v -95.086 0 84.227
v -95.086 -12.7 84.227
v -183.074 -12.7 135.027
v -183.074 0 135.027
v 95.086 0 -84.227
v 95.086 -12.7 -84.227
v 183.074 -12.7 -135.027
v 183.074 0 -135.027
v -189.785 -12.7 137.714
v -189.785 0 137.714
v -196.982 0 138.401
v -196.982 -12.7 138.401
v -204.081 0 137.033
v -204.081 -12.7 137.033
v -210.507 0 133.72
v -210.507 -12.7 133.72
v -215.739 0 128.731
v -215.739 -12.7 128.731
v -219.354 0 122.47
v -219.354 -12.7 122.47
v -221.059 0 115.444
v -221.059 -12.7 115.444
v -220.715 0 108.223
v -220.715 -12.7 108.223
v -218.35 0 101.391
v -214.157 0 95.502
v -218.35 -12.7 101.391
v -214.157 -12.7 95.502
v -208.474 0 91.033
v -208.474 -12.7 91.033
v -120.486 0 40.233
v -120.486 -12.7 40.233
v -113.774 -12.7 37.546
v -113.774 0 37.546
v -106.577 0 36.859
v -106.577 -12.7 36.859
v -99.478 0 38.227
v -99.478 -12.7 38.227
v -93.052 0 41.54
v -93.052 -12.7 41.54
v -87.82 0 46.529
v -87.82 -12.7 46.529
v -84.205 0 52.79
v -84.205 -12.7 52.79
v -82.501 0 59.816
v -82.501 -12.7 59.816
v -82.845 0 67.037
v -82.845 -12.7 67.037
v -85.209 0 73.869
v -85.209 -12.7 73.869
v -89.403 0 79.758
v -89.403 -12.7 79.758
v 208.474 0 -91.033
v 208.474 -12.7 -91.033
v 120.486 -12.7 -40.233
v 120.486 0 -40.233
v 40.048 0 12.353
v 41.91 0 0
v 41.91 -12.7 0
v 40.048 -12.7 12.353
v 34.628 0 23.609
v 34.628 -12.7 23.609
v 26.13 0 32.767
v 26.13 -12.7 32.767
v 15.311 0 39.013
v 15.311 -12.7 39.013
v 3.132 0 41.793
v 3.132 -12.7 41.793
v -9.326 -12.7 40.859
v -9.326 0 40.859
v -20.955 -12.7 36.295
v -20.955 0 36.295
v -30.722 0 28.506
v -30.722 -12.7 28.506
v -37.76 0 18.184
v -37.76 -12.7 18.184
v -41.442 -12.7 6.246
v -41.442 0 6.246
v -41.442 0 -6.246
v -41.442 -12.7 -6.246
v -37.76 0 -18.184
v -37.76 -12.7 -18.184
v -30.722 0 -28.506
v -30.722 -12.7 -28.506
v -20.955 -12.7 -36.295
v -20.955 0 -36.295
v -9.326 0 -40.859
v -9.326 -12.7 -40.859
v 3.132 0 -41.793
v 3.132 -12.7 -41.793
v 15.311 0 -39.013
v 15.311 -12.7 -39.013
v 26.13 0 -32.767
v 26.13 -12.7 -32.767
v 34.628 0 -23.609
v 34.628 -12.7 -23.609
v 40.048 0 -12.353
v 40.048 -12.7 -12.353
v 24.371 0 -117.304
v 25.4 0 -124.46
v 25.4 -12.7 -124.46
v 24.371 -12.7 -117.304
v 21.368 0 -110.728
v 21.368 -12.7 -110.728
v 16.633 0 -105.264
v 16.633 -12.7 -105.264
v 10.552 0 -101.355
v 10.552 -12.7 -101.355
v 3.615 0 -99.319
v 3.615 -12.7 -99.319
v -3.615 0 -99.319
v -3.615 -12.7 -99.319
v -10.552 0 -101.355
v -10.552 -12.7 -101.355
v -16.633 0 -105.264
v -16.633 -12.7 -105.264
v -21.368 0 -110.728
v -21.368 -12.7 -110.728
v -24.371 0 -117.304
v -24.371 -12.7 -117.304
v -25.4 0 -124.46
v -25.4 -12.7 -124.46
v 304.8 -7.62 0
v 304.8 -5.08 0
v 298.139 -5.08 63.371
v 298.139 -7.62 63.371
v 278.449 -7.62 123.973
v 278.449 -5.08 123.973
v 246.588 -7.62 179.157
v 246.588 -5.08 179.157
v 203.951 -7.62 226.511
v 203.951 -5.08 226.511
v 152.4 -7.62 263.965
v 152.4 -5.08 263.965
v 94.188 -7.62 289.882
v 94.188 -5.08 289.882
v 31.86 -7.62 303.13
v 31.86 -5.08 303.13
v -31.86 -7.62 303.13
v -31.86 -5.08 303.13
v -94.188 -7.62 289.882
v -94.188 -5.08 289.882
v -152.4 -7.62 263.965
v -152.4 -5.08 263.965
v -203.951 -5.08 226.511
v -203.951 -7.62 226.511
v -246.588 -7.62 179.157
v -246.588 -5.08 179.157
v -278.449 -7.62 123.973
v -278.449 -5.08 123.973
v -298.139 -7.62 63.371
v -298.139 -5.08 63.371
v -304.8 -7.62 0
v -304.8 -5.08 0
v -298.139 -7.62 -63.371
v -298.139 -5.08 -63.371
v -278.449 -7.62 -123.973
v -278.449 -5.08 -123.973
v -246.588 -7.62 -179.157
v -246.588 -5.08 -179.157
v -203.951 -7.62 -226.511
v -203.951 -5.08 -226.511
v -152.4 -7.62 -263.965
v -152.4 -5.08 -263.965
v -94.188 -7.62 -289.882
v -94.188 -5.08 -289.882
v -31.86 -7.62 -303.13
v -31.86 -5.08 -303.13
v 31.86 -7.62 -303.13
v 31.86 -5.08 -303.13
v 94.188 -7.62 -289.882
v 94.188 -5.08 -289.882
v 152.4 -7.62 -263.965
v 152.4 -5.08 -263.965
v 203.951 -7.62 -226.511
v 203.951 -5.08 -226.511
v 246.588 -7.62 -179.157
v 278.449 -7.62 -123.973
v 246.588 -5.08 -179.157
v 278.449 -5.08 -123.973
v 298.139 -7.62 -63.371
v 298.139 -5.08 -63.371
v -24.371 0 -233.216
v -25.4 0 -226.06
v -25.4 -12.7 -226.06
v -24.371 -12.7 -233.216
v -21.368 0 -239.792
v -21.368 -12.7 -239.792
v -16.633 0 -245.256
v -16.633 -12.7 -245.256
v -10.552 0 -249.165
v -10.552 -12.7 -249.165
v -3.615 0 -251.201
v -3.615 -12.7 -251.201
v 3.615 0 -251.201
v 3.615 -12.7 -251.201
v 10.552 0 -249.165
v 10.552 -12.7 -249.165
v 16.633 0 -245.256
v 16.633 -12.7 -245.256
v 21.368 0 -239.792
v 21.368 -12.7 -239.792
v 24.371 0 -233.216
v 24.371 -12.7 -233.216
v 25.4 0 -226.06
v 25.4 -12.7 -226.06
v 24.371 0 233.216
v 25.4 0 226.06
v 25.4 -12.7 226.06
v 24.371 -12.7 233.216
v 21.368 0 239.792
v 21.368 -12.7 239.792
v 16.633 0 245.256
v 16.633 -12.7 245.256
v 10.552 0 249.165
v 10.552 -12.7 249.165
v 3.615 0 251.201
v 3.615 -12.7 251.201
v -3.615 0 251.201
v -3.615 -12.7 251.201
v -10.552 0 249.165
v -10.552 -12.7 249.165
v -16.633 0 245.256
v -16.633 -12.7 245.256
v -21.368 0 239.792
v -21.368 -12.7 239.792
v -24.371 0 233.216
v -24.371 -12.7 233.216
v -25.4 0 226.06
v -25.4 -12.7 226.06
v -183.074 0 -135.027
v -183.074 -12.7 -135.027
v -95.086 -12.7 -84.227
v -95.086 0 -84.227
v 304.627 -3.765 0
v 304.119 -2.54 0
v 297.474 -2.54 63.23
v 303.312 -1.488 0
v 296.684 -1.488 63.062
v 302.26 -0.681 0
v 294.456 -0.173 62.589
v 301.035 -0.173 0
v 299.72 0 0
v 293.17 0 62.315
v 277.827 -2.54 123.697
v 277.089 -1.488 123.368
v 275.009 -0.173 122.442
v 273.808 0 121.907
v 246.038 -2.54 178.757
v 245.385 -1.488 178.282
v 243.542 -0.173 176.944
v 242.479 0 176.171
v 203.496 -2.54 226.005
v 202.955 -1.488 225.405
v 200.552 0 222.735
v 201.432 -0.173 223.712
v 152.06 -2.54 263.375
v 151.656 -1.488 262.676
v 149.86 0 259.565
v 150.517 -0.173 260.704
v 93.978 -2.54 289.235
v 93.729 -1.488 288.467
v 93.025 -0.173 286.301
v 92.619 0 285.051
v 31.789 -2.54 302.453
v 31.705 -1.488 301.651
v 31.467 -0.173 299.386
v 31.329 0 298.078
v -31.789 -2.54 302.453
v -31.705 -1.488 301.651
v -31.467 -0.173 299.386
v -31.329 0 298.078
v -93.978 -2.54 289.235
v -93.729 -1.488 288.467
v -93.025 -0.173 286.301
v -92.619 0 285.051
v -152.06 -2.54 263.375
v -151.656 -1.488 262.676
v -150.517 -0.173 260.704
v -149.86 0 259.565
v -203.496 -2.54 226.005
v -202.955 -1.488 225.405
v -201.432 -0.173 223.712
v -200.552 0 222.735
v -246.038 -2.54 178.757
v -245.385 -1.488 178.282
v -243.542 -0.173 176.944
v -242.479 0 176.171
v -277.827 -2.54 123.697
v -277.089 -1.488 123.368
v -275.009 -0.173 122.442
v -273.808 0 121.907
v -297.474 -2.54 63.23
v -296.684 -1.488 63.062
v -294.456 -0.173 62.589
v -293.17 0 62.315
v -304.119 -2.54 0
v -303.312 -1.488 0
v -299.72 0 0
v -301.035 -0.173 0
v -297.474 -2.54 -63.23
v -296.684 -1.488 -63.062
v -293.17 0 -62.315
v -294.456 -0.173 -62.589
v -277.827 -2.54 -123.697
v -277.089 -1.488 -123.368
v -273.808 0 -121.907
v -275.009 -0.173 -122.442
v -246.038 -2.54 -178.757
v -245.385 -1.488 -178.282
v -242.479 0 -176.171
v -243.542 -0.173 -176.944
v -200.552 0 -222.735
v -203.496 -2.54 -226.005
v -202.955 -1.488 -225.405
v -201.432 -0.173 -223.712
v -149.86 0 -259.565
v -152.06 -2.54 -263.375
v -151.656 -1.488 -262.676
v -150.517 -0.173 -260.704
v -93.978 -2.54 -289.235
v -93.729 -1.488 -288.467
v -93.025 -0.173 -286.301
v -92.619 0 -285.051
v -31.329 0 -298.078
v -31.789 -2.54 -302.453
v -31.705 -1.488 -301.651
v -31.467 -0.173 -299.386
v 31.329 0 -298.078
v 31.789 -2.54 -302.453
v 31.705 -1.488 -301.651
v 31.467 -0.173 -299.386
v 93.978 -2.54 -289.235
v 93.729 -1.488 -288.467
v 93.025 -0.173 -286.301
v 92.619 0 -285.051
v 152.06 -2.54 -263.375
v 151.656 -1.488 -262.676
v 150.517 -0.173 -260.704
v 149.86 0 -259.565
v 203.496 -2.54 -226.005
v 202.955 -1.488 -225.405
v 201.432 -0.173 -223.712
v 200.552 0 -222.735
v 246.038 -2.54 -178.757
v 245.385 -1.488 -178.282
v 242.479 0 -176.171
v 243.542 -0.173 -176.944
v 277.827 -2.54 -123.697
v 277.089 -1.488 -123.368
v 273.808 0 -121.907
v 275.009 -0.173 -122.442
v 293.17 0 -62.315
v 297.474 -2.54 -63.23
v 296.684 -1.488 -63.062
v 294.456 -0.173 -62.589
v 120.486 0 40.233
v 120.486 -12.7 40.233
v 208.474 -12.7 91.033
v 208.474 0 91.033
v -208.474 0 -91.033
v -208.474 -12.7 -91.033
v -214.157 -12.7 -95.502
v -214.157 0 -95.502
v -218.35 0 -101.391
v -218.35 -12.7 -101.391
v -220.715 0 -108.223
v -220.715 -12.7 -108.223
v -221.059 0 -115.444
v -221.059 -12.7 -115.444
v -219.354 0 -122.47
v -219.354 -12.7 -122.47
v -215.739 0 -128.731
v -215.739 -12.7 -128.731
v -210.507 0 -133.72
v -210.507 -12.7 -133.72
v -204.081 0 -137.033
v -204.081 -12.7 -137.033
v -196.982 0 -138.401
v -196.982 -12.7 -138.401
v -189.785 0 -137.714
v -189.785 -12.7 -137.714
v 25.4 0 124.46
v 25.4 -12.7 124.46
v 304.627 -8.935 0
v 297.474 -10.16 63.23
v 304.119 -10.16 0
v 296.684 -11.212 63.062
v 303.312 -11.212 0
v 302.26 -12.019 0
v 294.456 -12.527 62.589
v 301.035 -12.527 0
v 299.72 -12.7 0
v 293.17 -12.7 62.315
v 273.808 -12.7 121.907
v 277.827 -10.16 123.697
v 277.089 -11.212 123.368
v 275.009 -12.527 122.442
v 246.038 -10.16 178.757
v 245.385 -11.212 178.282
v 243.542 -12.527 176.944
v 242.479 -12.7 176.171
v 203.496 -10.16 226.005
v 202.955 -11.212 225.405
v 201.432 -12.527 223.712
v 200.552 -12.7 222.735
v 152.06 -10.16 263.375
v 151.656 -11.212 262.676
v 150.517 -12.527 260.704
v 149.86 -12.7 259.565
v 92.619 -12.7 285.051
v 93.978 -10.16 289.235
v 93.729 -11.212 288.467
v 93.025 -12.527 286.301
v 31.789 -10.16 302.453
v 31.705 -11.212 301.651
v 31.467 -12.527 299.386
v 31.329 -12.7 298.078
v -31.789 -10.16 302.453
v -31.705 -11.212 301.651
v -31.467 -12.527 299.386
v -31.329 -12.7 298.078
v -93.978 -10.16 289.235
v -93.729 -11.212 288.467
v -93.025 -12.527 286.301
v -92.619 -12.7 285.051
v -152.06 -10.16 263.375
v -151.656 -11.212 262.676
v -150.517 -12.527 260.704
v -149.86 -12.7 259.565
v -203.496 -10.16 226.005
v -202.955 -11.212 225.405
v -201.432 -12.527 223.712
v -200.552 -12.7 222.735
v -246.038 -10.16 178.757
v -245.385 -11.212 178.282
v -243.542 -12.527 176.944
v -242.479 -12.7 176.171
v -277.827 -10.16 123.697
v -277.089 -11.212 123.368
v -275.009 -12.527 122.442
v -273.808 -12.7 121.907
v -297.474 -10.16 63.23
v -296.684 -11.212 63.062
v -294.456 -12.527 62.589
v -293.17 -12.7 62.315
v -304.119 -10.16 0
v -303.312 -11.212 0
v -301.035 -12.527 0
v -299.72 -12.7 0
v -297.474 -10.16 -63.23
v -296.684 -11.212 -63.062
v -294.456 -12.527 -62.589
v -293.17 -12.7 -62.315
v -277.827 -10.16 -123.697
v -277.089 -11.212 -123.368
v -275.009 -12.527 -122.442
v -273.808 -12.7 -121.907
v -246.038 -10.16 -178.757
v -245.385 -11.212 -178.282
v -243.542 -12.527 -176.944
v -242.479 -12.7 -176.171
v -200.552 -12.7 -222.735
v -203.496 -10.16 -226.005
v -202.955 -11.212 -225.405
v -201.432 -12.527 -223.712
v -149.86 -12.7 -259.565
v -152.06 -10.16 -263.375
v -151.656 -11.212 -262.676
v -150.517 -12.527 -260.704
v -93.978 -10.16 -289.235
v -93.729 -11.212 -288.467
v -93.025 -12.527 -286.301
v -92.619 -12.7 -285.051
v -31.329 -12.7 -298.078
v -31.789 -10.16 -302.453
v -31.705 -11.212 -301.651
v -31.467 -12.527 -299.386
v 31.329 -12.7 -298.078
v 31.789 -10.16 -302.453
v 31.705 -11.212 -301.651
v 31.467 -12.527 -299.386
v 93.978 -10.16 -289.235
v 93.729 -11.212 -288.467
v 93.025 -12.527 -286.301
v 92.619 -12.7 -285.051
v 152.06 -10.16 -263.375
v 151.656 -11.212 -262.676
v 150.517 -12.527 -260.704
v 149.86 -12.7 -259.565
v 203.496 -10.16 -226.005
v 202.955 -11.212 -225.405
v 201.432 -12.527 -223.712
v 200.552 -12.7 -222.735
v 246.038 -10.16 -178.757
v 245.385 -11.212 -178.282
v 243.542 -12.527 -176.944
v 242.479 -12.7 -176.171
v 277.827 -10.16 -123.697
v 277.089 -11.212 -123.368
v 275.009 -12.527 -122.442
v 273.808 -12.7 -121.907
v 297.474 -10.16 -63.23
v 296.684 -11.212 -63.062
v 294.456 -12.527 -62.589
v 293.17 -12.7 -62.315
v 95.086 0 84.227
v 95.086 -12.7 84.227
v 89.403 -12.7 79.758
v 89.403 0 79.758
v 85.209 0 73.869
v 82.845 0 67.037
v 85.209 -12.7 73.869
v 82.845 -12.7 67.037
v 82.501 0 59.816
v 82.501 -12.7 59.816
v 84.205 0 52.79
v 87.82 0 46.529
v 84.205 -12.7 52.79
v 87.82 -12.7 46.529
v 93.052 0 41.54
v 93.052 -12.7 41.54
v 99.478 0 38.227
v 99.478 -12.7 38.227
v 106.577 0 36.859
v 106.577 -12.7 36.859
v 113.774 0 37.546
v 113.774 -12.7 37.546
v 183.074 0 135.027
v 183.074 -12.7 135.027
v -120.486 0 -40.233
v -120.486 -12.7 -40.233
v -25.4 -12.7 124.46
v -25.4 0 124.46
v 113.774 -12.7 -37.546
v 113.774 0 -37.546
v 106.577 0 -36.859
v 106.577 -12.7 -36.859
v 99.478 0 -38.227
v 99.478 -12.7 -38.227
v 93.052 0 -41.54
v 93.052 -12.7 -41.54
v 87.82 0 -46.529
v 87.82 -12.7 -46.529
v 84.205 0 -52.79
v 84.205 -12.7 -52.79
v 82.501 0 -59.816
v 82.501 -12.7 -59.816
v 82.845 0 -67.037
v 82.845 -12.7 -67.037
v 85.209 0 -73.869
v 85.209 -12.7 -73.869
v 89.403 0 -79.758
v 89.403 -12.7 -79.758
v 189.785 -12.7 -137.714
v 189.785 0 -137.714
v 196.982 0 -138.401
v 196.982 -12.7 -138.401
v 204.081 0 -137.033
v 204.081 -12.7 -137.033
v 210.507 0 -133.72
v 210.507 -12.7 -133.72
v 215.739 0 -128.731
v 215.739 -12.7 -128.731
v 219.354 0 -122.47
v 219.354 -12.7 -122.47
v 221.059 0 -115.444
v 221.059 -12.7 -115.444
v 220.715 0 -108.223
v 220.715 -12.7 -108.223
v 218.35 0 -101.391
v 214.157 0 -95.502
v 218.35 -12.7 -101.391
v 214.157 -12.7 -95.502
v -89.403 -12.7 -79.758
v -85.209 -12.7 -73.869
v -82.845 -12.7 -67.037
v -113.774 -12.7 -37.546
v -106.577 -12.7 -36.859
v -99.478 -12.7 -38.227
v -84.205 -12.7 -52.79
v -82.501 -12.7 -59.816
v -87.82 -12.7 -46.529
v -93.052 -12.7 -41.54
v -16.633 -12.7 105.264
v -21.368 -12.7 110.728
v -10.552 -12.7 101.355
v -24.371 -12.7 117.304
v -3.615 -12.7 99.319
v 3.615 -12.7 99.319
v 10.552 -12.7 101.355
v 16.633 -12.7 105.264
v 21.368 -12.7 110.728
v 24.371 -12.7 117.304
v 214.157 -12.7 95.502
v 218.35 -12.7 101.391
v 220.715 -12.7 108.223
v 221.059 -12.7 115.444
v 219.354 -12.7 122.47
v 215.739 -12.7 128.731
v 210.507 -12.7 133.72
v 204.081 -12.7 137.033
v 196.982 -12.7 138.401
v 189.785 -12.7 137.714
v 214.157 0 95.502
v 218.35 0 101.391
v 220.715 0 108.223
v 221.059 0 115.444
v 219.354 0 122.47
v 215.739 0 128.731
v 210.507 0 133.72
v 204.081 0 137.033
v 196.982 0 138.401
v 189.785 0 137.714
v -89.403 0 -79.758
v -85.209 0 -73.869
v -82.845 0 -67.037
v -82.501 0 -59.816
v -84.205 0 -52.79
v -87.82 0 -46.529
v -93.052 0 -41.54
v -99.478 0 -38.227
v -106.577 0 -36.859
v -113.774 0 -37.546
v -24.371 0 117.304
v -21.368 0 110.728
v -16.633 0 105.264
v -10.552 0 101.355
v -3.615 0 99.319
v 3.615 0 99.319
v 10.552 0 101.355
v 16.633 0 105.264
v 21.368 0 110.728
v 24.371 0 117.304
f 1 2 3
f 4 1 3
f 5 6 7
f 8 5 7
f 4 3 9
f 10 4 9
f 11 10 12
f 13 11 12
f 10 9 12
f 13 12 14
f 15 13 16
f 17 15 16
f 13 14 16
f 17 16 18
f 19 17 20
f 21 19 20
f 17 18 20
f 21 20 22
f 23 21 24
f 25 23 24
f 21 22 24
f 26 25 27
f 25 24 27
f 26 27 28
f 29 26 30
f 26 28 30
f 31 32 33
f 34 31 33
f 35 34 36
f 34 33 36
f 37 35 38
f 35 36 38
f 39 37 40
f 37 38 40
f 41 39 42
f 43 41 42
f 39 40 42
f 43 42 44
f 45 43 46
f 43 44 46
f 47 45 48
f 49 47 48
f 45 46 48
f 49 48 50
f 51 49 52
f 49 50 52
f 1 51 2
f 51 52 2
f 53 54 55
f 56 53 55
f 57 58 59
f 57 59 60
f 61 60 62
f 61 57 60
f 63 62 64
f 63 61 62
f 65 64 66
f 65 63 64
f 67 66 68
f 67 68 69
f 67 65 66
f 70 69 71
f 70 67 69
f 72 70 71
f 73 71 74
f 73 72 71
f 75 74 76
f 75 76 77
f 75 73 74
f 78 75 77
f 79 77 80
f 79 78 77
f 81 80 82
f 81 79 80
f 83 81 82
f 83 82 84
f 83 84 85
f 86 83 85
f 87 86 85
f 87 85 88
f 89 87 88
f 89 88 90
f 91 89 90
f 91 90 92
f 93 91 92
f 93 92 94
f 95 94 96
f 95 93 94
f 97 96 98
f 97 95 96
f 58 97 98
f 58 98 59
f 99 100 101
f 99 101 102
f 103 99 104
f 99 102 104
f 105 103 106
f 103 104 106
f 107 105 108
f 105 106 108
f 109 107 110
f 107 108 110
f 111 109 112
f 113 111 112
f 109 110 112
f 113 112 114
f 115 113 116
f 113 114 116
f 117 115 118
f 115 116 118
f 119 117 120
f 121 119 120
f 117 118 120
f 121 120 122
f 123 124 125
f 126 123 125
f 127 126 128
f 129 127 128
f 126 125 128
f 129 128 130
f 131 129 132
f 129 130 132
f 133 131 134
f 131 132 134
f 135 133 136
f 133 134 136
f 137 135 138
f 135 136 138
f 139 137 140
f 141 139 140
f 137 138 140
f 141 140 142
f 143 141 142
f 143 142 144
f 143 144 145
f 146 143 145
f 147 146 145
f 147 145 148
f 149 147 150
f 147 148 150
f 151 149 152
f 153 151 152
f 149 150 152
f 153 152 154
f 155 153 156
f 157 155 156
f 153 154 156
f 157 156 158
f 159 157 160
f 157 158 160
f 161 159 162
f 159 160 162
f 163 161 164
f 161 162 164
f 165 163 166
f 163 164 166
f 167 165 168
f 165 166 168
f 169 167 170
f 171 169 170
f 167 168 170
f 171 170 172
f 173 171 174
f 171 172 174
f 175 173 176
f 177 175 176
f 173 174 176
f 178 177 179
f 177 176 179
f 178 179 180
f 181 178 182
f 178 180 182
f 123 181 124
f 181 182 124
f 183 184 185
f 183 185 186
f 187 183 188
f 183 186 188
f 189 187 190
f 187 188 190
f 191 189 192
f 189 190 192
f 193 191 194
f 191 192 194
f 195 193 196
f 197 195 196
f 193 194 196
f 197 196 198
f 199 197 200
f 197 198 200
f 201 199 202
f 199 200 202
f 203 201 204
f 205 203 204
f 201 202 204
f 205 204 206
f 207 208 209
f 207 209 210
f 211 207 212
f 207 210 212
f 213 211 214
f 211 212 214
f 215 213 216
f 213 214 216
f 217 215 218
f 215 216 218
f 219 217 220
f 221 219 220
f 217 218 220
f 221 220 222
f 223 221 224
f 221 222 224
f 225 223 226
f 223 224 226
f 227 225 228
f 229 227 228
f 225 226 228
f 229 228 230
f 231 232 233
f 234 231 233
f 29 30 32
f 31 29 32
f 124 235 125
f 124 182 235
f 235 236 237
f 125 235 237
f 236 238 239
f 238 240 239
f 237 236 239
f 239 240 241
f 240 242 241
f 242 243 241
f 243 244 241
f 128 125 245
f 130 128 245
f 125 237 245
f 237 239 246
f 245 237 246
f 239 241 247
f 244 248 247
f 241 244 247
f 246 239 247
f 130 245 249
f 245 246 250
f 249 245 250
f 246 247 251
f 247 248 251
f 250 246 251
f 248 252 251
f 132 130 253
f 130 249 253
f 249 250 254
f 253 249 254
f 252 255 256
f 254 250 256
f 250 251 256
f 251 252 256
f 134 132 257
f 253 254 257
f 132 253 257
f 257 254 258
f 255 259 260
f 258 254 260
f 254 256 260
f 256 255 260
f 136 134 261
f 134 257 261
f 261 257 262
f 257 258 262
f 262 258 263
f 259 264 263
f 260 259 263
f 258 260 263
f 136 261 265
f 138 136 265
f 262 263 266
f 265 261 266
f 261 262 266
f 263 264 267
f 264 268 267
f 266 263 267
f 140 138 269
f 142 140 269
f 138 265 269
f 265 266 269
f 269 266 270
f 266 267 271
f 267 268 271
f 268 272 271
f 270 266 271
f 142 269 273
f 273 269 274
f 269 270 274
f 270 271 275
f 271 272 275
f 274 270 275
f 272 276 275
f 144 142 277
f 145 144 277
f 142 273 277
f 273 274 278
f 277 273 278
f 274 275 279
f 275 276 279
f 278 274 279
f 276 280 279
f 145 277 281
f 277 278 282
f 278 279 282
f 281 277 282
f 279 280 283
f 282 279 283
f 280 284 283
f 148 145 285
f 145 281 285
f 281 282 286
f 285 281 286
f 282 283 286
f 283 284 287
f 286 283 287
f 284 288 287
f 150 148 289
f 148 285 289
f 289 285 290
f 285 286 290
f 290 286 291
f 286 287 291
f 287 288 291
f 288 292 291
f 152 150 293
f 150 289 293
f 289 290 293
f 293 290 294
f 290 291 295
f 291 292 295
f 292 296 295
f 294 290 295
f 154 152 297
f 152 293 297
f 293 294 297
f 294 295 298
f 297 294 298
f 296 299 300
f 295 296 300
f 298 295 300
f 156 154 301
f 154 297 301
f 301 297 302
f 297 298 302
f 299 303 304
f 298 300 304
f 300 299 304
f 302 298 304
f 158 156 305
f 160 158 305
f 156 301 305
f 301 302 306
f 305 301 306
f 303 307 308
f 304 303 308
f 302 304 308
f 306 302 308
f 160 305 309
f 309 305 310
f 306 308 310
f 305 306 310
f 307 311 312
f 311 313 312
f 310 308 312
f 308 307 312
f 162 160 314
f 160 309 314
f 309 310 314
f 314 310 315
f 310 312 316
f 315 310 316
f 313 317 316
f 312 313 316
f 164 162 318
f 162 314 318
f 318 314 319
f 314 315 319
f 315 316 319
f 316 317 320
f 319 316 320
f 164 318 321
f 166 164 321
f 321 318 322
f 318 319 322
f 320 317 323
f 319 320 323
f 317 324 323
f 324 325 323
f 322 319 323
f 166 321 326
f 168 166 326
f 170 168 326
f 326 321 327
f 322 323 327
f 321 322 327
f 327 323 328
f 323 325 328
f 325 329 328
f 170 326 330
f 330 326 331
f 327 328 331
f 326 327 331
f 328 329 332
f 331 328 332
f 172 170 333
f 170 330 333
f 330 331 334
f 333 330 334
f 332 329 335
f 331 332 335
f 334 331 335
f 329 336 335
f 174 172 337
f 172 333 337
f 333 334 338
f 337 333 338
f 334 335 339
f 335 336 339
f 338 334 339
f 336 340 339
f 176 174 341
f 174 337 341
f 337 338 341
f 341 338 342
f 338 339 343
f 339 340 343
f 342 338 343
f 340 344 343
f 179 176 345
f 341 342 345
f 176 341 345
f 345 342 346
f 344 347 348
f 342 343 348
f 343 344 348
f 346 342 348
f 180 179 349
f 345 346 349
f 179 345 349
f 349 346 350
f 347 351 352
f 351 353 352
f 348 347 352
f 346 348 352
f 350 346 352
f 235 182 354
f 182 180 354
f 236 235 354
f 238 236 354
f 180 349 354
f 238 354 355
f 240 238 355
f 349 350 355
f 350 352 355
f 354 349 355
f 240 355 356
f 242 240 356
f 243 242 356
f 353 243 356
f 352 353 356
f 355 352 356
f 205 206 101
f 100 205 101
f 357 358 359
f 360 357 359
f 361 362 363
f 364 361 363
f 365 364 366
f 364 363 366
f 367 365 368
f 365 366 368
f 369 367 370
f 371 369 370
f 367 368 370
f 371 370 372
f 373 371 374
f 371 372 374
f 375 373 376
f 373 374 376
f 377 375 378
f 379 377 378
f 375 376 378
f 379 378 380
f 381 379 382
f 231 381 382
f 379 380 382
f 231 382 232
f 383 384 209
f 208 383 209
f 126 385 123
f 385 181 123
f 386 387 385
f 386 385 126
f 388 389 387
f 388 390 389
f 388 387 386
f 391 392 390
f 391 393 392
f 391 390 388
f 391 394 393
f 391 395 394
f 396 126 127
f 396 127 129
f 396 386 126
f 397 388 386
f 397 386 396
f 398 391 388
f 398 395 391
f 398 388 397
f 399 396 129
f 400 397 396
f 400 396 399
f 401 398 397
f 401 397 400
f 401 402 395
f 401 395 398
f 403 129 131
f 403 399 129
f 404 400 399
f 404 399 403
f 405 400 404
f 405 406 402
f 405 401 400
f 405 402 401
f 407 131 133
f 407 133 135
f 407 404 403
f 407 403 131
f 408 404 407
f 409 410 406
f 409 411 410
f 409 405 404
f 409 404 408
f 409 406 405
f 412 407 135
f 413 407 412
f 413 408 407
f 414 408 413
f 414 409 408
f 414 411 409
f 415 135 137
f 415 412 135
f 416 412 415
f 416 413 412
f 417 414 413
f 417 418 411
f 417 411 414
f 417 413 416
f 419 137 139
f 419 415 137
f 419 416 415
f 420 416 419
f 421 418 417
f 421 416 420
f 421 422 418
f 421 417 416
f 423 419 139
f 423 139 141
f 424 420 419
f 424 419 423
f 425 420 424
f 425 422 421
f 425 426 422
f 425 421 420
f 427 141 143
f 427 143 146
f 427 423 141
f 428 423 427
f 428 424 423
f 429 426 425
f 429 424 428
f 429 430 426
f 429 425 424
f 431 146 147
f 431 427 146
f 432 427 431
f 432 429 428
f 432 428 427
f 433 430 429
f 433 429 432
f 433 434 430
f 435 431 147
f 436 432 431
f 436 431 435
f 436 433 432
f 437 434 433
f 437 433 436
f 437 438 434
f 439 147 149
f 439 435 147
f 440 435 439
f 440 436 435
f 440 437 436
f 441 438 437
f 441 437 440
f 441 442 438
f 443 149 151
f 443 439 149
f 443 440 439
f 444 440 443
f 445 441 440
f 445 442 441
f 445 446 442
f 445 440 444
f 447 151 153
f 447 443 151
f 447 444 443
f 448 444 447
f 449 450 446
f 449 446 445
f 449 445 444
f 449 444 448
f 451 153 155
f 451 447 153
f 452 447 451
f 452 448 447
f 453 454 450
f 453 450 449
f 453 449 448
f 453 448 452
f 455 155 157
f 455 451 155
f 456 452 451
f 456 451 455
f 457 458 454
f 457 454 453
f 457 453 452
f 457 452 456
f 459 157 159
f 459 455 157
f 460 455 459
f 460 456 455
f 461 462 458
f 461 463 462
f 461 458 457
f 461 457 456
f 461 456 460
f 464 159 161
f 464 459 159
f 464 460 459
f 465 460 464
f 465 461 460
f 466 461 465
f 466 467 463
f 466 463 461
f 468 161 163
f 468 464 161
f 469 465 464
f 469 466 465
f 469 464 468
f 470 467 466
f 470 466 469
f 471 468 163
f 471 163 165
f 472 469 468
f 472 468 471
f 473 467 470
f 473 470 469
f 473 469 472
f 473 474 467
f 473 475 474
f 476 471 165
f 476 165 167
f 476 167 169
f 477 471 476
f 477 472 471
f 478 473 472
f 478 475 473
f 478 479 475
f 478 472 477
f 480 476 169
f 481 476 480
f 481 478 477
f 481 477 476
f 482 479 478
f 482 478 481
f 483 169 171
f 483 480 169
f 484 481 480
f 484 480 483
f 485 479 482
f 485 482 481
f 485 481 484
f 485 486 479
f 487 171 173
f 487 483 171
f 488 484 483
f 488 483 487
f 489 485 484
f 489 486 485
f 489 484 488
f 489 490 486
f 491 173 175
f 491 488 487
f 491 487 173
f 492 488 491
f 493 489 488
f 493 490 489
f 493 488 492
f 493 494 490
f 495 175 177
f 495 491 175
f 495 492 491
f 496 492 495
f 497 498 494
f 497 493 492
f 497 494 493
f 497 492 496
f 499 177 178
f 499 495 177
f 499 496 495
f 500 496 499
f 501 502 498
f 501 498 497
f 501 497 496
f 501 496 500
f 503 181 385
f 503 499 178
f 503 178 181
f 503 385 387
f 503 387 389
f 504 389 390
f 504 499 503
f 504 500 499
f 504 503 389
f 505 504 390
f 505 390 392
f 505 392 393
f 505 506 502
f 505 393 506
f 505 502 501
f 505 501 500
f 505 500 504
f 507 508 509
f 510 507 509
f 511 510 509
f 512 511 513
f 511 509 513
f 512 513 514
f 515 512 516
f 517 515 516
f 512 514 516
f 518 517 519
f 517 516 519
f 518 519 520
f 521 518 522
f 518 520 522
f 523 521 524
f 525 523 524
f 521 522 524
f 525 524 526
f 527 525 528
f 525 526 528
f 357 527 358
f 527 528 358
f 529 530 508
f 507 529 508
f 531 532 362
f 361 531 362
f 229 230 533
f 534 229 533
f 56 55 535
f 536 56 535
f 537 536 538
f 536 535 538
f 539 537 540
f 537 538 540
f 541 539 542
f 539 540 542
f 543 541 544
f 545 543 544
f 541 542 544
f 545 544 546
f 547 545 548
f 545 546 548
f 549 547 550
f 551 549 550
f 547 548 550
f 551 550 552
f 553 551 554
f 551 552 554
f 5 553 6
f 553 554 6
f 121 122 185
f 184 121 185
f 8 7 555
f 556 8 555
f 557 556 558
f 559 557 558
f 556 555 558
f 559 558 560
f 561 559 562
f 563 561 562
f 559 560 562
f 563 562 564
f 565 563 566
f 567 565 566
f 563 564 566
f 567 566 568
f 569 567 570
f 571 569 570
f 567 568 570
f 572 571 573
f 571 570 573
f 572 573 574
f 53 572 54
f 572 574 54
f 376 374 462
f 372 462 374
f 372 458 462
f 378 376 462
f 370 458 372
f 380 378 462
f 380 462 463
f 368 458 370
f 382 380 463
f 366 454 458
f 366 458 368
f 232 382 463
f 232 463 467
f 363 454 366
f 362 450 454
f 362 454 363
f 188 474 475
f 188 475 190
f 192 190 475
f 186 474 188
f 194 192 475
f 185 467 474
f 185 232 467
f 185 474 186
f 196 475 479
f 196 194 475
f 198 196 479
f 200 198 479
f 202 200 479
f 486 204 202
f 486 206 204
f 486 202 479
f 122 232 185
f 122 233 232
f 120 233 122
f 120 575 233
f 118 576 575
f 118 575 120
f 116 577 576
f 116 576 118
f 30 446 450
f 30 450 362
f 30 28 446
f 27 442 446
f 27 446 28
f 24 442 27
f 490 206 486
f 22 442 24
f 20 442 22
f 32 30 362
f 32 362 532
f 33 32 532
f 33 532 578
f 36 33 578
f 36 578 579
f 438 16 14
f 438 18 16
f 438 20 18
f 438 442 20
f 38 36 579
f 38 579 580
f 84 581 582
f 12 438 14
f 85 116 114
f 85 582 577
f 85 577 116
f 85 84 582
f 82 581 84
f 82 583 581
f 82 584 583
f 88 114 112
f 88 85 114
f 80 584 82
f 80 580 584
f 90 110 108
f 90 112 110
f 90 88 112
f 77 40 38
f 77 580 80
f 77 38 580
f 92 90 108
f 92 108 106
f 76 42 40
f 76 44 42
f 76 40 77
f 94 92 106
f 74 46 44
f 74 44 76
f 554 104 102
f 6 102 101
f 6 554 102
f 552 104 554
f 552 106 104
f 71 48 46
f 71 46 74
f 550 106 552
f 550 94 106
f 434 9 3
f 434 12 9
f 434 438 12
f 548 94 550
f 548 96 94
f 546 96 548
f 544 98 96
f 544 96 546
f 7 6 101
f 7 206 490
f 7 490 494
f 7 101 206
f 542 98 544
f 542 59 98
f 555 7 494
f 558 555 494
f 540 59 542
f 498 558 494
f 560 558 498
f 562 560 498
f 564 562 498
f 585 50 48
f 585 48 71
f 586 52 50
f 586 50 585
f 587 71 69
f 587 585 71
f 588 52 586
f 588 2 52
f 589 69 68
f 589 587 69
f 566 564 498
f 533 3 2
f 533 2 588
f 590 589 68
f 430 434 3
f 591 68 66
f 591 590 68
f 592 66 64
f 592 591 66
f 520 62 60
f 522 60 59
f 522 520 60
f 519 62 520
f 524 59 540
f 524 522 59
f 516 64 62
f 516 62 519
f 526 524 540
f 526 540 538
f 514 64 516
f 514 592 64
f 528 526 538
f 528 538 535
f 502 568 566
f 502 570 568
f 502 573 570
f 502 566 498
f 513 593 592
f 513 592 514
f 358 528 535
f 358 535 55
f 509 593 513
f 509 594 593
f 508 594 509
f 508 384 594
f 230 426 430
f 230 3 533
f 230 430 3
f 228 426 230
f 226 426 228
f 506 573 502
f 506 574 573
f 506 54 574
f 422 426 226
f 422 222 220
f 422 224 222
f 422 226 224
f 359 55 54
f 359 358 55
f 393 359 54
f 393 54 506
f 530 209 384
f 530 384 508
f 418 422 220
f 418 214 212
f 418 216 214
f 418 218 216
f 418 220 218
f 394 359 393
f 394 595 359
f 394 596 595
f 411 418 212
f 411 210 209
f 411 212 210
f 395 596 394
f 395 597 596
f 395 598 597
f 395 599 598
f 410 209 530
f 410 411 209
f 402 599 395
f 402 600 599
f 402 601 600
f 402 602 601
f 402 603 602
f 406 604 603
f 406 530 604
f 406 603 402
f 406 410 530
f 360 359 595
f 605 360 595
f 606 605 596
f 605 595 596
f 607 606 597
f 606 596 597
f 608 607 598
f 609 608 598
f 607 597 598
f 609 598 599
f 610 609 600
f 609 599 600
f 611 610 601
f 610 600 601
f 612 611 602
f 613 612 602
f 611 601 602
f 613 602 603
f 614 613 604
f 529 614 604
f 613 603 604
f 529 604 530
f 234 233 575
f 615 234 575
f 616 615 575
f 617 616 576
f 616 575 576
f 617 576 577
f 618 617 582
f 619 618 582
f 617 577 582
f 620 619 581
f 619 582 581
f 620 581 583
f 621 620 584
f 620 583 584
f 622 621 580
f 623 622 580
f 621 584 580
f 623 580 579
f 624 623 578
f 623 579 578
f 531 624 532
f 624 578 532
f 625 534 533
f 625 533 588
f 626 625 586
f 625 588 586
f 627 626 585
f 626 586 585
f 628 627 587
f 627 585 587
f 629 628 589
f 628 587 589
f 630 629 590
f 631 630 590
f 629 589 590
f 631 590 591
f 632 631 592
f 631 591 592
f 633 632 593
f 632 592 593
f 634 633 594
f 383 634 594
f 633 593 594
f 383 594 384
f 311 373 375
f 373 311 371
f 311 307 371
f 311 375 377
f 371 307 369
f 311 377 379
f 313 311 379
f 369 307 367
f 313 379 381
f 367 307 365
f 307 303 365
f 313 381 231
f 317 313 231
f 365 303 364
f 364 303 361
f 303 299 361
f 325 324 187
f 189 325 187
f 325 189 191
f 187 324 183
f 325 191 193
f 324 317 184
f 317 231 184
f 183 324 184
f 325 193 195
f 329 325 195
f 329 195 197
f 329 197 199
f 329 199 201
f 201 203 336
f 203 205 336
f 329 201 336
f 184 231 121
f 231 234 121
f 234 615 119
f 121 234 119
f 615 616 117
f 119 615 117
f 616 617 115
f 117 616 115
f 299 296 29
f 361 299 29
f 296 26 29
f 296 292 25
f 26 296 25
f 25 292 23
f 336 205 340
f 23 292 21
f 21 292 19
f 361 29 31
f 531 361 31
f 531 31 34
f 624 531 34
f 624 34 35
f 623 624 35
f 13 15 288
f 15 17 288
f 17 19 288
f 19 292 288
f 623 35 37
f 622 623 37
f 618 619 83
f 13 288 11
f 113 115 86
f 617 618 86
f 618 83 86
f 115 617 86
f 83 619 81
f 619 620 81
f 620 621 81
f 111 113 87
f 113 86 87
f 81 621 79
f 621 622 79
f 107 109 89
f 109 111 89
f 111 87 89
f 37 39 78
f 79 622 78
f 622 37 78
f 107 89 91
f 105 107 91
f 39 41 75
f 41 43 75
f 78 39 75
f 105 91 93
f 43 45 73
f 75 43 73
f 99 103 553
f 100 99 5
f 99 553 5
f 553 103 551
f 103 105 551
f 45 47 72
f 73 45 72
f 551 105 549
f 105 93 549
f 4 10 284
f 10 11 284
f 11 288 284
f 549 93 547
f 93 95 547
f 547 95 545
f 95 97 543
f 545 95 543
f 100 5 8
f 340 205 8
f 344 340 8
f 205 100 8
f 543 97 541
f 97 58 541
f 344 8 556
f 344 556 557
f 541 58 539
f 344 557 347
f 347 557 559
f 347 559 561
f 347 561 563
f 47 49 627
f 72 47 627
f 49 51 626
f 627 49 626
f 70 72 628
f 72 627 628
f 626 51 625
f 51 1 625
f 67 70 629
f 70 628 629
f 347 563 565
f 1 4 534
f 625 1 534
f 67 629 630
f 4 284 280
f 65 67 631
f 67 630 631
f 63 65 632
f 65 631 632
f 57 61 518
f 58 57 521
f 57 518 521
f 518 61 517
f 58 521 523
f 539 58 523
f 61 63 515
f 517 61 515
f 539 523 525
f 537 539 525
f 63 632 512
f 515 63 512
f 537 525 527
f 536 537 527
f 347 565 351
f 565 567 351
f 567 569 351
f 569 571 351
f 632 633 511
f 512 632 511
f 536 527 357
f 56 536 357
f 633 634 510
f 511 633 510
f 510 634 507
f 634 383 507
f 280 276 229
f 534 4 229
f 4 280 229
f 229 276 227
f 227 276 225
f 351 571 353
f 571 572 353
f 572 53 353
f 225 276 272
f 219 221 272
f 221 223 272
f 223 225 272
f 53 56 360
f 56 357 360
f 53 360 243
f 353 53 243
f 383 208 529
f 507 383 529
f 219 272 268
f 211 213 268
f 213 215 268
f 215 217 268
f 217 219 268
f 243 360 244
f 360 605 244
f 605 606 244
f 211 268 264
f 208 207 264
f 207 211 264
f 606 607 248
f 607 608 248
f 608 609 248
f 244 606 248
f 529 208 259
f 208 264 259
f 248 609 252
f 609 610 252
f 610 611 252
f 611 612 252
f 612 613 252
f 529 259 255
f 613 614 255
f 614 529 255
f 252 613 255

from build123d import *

# Parameters (mm, degrees)
F0_R     = 304.8
F0_R_2   = 41.91
F1_DEPTH = 12.7
F3_DEPTH = 12.701
F4_R     = 5.08


# Not quite as in the source:
# - a feature names something its author has since deleted; it is built from what else it names


with BuildPart() as f1:
    # F0 (on Front) → F1 (new body)
    with BuildSketch(Plane.XZ):
        Circle(F0_R)
        Circle(F0_R_2, mode=Mode.SUBTRACT)
    extrude(amount=F1_DEPTH)

    # F2 (on face) → F3 (cut, through all)
    with BuildSketch(Plane.XZ.offset(12.7)):
        with BuildLine():
            Line((-25.4, 226.06), (-25.4, 124.46))
            ThreePointArc((-25.4, 124.46), (0, 99.06), (25.4, 124.46))
            Line((25.4, 124.46), (25.4, 226.06))
            ThreePointArc((25.4, 226.06), (0, 251.46), (-25.4, 226.06))
        make_face()
        with BuildLine():
            Line((-183.0737027795, -135.0270452561), (-95.085521755, -84.2270452561))
            ThreePointArc((-95.085521755, -84.2270452561), (-85.7884764989, -49.53), (-120.485521755, -40.2329547439))
            Line((-120.485521755, -40.2329547439), (-208.4737027795, -91.0329547439))
            ThreePointArc((-208.4737027795, -91.0329547439), (-217.7707480356, -125.73), (-183.0737027795, -135.0270452561))
        make_face()
        with BuildLine():
            Line((-208.4737027795, 91.0329547439), (-120.485521755, 40.2329547439))
            ThreePointArc((-120.485521755, 40.2329547439), (-85.7884764989, 49.53), (-95.085521755, 84.2270452561))
            Line((-95.085521755, 84.2270452561), (-183.0737027795, 135.0270452561))
            ThreePointArc((-183.0737027795, 135.0270452561), (-217.7707480356, 125.73), (-208.4737027795, 91.0329547439))
        make_face()
        with BuildLine():
            Line((183.0737027795, 135.0270452561), (95.085521755, 84.2270452561))
            ThreePointArc((95.085521755, 84.2270452561), (85.7884764989, 49.53), (120.485521755, 40.2329547439))
            Line((120.485521755, 40.2329547439), (208.4737027795, 91.0329547439))
            ThreePointArc((208.4737027795, 91.0329547439), (217.7707480356, 125.73), (183.0737027795, 135.0270452561))
        make_face()
        with BuildLine():
            Line((208.4737027795, -91.0329547439), (120.485521755, -40.2329547439))
            ThreePointArc((120.485521755, -40.2329547439), (85.7884764989, -49.53), (95.085521755, -84.2270452561))
            Line((95.085521755, -84.2270452561), (183.0737027795, -135.0270452561))
            ThreePointArc((183.0737027795, -135.0270452561), (217.7707480356, -125.73), (208.4737027795, -91.0329547439))
        make_face()
        with BuildLine():
            Line((25.4, -226.06), (25.4, -124.46))
            ThreePointArc((25.4, -124.46), (0, -99.06), (-25.4, -124.46))
            Line((-25.4, -124.46), (-25.4, -226.06))
            ThreePointArc((-25.4, -226.06), (0, -251.46), (25.4, -226.06))
        make_face()
    extrude(amount=-F3_DEPTH, mode=Mode.SUBTRACT)

    # F4
    f4_edges = [f1.edges().sort_by_distance(p)[0] for p in [
        (-304.8, 0, 0),
        (-304.8, -12.7, 0),
    ]]
    fillet(f4_edges, radius=F4_R)


solid = f1.part
